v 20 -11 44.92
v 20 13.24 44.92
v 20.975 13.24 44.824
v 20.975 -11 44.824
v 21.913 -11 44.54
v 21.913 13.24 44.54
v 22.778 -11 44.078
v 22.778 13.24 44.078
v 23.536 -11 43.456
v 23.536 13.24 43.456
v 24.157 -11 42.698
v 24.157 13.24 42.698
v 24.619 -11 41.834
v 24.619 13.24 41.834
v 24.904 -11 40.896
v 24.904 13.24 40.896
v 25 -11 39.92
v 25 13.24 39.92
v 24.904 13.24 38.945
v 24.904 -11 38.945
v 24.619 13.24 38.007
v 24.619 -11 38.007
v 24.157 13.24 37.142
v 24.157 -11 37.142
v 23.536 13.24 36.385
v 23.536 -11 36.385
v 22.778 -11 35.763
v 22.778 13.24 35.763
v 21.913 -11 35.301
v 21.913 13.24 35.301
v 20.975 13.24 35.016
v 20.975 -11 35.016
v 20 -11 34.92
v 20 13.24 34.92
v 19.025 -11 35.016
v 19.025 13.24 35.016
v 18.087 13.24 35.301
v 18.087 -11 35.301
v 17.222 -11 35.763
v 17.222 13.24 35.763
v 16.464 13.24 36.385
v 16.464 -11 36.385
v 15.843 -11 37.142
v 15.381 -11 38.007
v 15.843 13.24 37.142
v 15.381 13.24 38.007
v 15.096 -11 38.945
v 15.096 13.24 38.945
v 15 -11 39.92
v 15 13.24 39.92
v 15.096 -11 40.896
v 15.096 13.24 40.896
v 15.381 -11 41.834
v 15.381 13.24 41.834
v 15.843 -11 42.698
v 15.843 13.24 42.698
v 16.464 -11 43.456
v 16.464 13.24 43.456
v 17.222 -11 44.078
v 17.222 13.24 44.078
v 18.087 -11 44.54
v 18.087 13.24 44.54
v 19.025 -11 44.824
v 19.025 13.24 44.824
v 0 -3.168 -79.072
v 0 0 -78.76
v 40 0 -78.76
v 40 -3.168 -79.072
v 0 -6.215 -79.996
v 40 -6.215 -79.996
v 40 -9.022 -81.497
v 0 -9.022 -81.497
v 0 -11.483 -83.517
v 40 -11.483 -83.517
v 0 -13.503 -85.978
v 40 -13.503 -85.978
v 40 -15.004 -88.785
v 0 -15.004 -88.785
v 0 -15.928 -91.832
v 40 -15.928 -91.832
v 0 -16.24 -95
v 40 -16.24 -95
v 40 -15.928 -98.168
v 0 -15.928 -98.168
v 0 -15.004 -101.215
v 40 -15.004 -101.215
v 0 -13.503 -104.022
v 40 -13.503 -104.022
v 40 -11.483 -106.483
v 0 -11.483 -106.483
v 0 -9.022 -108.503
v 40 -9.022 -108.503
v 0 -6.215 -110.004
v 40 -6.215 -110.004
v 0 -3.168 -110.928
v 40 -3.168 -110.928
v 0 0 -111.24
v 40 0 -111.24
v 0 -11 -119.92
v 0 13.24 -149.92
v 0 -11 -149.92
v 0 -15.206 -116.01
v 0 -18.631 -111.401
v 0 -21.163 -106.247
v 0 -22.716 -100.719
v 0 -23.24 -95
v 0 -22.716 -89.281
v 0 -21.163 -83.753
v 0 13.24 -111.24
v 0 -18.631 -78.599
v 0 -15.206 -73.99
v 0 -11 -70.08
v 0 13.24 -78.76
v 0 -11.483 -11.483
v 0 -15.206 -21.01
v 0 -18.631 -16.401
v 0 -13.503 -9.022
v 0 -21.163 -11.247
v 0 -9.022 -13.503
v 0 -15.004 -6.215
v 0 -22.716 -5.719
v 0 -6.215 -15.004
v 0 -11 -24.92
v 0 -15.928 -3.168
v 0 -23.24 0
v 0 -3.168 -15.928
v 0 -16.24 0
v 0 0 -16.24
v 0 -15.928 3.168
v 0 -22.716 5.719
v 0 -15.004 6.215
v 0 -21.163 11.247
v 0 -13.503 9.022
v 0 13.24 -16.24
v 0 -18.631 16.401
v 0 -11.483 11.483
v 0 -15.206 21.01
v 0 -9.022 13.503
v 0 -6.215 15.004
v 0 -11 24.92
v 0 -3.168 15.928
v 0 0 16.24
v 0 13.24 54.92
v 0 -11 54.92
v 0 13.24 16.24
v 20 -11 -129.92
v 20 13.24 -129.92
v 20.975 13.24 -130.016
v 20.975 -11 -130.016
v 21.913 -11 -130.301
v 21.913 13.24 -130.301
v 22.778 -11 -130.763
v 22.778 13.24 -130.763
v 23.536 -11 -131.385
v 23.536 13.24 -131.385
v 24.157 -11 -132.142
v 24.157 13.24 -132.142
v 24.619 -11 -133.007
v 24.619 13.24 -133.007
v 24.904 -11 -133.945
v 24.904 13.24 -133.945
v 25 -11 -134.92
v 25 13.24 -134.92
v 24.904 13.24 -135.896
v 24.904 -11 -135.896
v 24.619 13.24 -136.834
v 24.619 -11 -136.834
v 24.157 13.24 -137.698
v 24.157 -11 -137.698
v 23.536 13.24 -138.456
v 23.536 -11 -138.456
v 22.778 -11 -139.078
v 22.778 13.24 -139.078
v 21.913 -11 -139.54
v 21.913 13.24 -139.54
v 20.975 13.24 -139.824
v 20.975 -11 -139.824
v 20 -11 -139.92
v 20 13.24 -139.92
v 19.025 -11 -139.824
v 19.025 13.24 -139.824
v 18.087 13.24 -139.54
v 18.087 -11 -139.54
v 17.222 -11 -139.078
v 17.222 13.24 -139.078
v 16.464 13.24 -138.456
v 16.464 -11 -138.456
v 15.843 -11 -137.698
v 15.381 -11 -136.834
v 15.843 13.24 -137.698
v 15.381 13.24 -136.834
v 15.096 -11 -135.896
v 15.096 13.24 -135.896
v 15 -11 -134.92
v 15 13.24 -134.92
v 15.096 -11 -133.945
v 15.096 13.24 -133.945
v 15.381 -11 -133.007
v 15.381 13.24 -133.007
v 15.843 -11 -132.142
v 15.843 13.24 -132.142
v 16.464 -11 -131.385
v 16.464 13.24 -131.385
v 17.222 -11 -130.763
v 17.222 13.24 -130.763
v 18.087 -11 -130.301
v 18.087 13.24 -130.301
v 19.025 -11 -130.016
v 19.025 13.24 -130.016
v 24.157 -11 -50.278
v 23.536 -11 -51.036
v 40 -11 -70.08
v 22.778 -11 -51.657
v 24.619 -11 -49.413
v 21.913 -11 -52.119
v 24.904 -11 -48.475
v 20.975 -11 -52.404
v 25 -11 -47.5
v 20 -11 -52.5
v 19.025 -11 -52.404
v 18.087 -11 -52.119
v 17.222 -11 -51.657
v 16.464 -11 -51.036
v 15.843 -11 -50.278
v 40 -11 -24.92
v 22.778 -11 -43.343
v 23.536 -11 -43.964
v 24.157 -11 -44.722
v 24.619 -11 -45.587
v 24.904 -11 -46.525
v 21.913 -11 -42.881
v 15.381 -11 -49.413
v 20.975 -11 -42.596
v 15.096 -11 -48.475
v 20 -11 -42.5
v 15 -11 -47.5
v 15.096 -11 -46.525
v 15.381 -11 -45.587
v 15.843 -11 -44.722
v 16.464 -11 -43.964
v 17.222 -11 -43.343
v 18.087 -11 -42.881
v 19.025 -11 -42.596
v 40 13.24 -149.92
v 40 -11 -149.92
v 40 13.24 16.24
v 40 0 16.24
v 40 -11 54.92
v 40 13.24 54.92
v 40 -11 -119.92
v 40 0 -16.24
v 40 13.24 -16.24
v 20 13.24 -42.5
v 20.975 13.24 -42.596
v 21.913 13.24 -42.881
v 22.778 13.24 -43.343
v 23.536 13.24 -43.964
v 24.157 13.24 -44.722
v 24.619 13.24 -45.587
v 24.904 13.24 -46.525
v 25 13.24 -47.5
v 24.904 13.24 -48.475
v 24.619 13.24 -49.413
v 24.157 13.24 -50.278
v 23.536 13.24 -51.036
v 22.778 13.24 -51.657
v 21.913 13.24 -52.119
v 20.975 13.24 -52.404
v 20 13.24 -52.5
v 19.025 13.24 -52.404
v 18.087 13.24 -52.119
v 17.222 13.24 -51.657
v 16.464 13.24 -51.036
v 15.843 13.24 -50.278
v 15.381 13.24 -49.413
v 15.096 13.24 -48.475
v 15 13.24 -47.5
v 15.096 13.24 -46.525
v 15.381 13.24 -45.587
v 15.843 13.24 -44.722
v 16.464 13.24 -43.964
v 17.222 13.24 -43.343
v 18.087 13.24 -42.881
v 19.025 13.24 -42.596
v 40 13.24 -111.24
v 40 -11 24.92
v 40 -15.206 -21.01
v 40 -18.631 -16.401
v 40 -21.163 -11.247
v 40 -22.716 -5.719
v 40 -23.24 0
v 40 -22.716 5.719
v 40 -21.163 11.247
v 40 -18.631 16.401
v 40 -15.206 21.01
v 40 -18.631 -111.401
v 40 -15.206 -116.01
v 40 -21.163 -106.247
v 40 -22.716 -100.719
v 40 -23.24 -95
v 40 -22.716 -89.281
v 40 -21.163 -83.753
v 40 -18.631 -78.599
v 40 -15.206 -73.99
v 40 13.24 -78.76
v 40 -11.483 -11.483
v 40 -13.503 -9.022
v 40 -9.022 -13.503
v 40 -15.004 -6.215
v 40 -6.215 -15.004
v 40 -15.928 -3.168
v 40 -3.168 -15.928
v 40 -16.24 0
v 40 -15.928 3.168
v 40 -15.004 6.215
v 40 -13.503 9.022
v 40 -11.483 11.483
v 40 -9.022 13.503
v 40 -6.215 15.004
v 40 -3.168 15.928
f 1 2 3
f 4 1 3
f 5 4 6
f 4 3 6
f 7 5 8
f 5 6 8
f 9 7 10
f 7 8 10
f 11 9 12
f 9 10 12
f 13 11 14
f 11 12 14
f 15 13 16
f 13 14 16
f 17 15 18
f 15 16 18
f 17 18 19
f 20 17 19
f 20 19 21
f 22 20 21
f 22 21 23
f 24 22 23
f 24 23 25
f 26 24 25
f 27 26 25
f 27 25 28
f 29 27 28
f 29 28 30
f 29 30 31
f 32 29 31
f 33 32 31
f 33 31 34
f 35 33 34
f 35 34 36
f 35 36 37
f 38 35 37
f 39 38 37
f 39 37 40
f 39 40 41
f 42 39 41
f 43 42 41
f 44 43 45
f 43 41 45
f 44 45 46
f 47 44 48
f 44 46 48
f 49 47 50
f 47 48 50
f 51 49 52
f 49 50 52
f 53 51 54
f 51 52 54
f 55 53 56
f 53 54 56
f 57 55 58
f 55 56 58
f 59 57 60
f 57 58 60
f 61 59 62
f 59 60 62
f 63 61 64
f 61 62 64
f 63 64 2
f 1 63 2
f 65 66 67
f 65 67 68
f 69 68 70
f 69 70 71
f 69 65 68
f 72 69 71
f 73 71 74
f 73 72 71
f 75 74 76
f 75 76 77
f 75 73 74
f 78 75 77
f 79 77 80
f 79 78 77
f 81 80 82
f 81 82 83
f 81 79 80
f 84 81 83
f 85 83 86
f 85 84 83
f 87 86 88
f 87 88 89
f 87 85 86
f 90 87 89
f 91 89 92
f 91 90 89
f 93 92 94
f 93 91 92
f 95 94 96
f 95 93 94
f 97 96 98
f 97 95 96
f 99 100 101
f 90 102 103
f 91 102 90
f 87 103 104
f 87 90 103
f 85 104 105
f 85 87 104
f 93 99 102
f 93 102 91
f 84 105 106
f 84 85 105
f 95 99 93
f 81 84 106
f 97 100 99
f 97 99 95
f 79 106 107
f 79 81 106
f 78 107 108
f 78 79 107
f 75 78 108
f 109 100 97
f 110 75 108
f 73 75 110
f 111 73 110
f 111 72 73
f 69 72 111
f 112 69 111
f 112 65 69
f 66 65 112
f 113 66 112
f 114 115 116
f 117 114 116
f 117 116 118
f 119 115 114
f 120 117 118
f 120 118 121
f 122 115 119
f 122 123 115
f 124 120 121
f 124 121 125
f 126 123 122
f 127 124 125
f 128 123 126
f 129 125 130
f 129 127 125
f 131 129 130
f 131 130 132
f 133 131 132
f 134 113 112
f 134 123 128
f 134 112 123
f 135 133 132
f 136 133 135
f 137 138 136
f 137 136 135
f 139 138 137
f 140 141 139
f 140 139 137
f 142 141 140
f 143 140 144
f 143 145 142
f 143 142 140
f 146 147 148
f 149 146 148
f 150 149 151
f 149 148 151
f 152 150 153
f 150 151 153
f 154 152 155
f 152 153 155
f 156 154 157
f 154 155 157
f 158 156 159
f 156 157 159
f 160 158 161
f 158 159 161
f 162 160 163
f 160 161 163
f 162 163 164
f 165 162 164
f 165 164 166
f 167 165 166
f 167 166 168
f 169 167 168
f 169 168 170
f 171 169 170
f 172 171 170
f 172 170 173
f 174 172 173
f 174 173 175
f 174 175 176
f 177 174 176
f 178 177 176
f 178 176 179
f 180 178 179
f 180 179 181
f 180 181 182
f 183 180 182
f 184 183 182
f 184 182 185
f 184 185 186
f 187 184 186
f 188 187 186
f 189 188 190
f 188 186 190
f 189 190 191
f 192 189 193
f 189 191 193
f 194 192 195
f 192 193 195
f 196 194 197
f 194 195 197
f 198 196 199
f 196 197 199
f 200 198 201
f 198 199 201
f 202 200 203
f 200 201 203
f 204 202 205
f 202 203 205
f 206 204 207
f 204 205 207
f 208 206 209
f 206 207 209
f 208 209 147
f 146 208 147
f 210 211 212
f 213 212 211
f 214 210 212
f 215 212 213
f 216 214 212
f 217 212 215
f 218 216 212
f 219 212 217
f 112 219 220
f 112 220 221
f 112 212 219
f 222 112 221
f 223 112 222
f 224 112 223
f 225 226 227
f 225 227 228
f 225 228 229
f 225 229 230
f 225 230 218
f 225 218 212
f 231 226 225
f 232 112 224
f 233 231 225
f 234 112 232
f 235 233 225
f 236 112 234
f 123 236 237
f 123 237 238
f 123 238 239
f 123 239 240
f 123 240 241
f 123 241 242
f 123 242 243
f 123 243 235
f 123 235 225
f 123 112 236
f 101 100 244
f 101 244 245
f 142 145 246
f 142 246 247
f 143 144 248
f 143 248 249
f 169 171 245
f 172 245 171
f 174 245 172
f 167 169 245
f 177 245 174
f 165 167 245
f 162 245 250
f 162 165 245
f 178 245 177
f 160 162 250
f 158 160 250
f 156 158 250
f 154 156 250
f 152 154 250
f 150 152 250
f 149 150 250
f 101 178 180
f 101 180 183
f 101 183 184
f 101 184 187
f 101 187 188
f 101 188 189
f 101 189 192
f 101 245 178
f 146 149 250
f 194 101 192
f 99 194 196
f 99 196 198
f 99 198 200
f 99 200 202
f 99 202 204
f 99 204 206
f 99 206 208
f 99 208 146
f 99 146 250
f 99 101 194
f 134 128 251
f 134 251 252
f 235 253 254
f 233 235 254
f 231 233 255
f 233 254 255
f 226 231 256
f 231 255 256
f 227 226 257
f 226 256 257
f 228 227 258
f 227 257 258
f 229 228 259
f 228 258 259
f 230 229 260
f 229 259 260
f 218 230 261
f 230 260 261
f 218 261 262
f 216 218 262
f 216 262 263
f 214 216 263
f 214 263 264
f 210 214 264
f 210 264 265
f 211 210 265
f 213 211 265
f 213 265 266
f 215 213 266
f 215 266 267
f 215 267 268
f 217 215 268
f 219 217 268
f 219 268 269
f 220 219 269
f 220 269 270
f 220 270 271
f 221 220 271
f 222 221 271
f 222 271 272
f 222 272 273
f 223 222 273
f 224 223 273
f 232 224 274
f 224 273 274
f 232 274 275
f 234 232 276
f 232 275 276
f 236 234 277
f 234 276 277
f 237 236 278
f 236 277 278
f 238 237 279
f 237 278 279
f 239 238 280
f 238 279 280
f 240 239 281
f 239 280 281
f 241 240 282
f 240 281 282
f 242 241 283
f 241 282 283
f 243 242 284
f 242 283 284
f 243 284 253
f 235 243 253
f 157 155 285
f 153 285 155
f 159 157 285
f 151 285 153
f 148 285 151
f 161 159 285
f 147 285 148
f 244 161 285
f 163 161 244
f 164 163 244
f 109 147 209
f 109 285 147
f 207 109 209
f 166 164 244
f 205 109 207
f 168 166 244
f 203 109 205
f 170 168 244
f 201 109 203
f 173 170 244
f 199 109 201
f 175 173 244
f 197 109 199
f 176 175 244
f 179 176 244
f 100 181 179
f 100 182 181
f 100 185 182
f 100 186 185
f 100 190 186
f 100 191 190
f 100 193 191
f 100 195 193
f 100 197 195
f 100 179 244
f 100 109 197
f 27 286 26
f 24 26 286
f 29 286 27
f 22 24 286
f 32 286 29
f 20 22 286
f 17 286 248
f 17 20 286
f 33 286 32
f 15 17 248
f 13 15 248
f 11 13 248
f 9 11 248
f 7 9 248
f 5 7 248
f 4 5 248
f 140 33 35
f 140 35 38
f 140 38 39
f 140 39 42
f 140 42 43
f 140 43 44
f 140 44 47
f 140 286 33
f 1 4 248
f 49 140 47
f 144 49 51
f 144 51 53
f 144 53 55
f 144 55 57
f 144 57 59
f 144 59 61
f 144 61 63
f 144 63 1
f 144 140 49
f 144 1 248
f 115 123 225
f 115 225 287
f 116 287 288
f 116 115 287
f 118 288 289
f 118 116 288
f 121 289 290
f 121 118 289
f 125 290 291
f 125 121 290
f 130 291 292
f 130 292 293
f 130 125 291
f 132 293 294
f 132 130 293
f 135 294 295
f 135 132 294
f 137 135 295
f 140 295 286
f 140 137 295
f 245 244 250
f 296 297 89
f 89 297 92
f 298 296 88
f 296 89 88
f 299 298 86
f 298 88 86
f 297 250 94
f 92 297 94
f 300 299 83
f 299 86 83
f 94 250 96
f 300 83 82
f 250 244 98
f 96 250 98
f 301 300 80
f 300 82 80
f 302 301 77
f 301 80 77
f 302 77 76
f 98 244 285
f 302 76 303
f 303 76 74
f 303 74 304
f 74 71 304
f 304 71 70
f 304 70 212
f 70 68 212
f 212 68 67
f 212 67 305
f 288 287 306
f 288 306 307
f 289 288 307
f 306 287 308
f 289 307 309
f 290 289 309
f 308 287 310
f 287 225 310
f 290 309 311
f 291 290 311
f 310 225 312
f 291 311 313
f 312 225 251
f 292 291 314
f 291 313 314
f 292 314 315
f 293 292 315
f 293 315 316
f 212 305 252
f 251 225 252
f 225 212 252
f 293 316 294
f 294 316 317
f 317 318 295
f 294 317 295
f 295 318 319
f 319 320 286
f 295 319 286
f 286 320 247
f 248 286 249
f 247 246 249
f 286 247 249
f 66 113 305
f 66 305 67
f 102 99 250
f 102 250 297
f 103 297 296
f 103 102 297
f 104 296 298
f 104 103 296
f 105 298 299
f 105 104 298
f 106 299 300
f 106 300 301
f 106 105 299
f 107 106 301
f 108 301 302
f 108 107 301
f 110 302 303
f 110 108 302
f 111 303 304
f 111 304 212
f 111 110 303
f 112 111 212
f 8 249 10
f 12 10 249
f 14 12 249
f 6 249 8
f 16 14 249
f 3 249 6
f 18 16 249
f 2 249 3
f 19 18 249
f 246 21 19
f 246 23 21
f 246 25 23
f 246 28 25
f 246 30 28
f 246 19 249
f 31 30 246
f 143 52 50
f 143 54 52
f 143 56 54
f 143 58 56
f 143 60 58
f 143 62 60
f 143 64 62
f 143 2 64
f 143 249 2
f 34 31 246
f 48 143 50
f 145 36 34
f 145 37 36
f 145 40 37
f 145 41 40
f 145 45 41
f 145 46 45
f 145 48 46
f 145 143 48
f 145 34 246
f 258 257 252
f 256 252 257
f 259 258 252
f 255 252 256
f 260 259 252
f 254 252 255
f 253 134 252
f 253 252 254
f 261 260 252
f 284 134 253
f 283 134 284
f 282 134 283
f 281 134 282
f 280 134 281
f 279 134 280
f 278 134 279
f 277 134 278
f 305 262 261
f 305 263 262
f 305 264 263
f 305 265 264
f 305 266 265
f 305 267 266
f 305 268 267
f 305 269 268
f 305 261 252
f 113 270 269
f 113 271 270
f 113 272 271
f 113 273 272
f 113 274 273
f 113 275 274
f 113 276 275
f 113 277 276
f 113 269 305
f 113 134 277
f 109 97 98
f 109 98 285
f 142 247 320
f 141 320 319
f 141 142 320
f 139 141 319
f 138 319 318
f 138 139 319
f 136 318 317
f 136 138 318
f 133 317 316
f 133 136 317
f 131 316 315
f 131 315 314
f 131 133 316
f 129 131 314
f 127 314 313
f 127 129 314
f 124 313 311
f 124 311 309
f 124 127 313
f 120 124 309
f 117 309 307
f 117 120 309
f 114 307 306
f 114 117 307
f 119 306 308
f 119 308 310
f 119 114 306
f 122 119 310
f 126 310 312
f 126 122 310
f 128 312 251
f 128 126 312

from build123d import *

# Parameters (mm, degrees)
BOSS_EXTRUDE1_DEPTH = 40
CUT_EXTRUDE1_REACH  = 161.395
SKETCH3_R           = 5


with BuildPart() as part:
    # Sketch2 → Boss-Extrude1 (new body)
    with BuildSketch(Plane(origin=(0, 0, 0), x_dir=(0, 0, -1), z_dir=(1, 0, 0))):
        with BuildLine():
            Line((-24.920224718, -11), (-54.920224718, -11))
            Line((-54.920224718, -11), (-54.920224718, 0))
            Line((-54.920224718, 0), (-54.920224718, 13.24))
            Line((-54.920224718, 13.24), (-16.24, 13.24))
            Line((-16.24, 13.24), (-16.24, 0))
            ThreePointArc((-16.24, 0), (0, -16.24), (16.24, 0))
            Line((16.24, 0), (16.24, 13.24))
            Line((16.24, 13.24), (78.76, 13.24))
            Line((78.76, 13.24), (78.76, 0))
            ThreePointArc((78.76, 0), (95, -16.24), (111.24, 0))
            Line((111.24, 0), (111.24, 13.24))
            Line((111.24, 13.24), (149.920224718, 13.24))
            Line((149.920224718, 13.24), (149.920224718, 0))
            Line((149.920224718, 0), (149.920224718, -11))
            Line((149.920224718, -11), (119.920224718, -11))
            ThreePointArc((119.920224718, -11), (95, -23.24), (70.079775282, -11))
            Line((70.079775282, -11), (24.920224718, -11))
            ThreePointArc((24.920224718, -11), (0, -23.24), (-24.920224718, -11))
        make_face()
    extrude(amount=BOSS_EXTRUDE1_DEPTH)

    # Sketch3 → Cut-Extrude1 (cut, up to next)
    with BuildSketch(Plane(origin=(0, 13.24, 0), x_dir=(1, 0, 0), z_dir=(0, 1, 0)), mode=Mode.PRIVATE) as cut_extrude1_sk1:
        with Locations(Location((20, -39.920224718, 0), (0, 0, 270))):
            Circle(SKETCH3_R)
    cut_extrude1_tool1 = extrude(cut_extrude1_sk1.sketch, amount=-CUT_EXTRUDE1_REACH, mode=Mode.PRIVATE) & part.part
    # Sketch3 → Cut-Extrude1 (cut, up to next)
    with BuildSketch(Plane(origin=(0, 13.24, 0), x_dir=(1, 0, 0), z_dir=(0, 1, 0)), mode=Mode.PRIVATE) as cut_extrude1_sk2:
        with Locations(Location((20, 134.920224718, 0), (0, 0, 270))):
            Circle(SKETCH3_R)
    cut_extrude1_tool2 = extrude(cut_extrude1_sk2.sketch, amount=-CUT_EXTRUDE1_REACH, mode=Mode.PRIVATE) & part.part
    # Sketch3 → Cut-Extrude1 (cut, up to next)
    with BuildSketch(Plane(origin=(0, 13.24, 0), x_dir=(1, 0, 0), z_dir=(0, 1, 0)), mode=Mode.PRIVATE) as cut_extrude1_sk3:
        with Locations(Location((20, 47.5, 0), (0, 0, 270))):
            Circle(SKETCH3_R)
    cut_extrude1_tool3 = extrude(cut_extrude1_sk3.sketch, amount=-CUT_EXTRUDE1_REACH, mode=Mode.PRIVATE) & part.part
    add(cut_extrude1_tool1.solids().sort_by_distance((20, 13.24, 39.920225))[0], mode=Mode.SUBTRACT)
    add(cut_extrude1_tool2.solids().sort_by_distance((20, 13.24, -134.920225))[0], mode=Mode.SUBTRACT)
    add(cut_extrude1_tool3.solids().sort_by_distance((20, 13.24, -47.5))[0], mode=Mode.SUBTRACT)


solid = part.part
